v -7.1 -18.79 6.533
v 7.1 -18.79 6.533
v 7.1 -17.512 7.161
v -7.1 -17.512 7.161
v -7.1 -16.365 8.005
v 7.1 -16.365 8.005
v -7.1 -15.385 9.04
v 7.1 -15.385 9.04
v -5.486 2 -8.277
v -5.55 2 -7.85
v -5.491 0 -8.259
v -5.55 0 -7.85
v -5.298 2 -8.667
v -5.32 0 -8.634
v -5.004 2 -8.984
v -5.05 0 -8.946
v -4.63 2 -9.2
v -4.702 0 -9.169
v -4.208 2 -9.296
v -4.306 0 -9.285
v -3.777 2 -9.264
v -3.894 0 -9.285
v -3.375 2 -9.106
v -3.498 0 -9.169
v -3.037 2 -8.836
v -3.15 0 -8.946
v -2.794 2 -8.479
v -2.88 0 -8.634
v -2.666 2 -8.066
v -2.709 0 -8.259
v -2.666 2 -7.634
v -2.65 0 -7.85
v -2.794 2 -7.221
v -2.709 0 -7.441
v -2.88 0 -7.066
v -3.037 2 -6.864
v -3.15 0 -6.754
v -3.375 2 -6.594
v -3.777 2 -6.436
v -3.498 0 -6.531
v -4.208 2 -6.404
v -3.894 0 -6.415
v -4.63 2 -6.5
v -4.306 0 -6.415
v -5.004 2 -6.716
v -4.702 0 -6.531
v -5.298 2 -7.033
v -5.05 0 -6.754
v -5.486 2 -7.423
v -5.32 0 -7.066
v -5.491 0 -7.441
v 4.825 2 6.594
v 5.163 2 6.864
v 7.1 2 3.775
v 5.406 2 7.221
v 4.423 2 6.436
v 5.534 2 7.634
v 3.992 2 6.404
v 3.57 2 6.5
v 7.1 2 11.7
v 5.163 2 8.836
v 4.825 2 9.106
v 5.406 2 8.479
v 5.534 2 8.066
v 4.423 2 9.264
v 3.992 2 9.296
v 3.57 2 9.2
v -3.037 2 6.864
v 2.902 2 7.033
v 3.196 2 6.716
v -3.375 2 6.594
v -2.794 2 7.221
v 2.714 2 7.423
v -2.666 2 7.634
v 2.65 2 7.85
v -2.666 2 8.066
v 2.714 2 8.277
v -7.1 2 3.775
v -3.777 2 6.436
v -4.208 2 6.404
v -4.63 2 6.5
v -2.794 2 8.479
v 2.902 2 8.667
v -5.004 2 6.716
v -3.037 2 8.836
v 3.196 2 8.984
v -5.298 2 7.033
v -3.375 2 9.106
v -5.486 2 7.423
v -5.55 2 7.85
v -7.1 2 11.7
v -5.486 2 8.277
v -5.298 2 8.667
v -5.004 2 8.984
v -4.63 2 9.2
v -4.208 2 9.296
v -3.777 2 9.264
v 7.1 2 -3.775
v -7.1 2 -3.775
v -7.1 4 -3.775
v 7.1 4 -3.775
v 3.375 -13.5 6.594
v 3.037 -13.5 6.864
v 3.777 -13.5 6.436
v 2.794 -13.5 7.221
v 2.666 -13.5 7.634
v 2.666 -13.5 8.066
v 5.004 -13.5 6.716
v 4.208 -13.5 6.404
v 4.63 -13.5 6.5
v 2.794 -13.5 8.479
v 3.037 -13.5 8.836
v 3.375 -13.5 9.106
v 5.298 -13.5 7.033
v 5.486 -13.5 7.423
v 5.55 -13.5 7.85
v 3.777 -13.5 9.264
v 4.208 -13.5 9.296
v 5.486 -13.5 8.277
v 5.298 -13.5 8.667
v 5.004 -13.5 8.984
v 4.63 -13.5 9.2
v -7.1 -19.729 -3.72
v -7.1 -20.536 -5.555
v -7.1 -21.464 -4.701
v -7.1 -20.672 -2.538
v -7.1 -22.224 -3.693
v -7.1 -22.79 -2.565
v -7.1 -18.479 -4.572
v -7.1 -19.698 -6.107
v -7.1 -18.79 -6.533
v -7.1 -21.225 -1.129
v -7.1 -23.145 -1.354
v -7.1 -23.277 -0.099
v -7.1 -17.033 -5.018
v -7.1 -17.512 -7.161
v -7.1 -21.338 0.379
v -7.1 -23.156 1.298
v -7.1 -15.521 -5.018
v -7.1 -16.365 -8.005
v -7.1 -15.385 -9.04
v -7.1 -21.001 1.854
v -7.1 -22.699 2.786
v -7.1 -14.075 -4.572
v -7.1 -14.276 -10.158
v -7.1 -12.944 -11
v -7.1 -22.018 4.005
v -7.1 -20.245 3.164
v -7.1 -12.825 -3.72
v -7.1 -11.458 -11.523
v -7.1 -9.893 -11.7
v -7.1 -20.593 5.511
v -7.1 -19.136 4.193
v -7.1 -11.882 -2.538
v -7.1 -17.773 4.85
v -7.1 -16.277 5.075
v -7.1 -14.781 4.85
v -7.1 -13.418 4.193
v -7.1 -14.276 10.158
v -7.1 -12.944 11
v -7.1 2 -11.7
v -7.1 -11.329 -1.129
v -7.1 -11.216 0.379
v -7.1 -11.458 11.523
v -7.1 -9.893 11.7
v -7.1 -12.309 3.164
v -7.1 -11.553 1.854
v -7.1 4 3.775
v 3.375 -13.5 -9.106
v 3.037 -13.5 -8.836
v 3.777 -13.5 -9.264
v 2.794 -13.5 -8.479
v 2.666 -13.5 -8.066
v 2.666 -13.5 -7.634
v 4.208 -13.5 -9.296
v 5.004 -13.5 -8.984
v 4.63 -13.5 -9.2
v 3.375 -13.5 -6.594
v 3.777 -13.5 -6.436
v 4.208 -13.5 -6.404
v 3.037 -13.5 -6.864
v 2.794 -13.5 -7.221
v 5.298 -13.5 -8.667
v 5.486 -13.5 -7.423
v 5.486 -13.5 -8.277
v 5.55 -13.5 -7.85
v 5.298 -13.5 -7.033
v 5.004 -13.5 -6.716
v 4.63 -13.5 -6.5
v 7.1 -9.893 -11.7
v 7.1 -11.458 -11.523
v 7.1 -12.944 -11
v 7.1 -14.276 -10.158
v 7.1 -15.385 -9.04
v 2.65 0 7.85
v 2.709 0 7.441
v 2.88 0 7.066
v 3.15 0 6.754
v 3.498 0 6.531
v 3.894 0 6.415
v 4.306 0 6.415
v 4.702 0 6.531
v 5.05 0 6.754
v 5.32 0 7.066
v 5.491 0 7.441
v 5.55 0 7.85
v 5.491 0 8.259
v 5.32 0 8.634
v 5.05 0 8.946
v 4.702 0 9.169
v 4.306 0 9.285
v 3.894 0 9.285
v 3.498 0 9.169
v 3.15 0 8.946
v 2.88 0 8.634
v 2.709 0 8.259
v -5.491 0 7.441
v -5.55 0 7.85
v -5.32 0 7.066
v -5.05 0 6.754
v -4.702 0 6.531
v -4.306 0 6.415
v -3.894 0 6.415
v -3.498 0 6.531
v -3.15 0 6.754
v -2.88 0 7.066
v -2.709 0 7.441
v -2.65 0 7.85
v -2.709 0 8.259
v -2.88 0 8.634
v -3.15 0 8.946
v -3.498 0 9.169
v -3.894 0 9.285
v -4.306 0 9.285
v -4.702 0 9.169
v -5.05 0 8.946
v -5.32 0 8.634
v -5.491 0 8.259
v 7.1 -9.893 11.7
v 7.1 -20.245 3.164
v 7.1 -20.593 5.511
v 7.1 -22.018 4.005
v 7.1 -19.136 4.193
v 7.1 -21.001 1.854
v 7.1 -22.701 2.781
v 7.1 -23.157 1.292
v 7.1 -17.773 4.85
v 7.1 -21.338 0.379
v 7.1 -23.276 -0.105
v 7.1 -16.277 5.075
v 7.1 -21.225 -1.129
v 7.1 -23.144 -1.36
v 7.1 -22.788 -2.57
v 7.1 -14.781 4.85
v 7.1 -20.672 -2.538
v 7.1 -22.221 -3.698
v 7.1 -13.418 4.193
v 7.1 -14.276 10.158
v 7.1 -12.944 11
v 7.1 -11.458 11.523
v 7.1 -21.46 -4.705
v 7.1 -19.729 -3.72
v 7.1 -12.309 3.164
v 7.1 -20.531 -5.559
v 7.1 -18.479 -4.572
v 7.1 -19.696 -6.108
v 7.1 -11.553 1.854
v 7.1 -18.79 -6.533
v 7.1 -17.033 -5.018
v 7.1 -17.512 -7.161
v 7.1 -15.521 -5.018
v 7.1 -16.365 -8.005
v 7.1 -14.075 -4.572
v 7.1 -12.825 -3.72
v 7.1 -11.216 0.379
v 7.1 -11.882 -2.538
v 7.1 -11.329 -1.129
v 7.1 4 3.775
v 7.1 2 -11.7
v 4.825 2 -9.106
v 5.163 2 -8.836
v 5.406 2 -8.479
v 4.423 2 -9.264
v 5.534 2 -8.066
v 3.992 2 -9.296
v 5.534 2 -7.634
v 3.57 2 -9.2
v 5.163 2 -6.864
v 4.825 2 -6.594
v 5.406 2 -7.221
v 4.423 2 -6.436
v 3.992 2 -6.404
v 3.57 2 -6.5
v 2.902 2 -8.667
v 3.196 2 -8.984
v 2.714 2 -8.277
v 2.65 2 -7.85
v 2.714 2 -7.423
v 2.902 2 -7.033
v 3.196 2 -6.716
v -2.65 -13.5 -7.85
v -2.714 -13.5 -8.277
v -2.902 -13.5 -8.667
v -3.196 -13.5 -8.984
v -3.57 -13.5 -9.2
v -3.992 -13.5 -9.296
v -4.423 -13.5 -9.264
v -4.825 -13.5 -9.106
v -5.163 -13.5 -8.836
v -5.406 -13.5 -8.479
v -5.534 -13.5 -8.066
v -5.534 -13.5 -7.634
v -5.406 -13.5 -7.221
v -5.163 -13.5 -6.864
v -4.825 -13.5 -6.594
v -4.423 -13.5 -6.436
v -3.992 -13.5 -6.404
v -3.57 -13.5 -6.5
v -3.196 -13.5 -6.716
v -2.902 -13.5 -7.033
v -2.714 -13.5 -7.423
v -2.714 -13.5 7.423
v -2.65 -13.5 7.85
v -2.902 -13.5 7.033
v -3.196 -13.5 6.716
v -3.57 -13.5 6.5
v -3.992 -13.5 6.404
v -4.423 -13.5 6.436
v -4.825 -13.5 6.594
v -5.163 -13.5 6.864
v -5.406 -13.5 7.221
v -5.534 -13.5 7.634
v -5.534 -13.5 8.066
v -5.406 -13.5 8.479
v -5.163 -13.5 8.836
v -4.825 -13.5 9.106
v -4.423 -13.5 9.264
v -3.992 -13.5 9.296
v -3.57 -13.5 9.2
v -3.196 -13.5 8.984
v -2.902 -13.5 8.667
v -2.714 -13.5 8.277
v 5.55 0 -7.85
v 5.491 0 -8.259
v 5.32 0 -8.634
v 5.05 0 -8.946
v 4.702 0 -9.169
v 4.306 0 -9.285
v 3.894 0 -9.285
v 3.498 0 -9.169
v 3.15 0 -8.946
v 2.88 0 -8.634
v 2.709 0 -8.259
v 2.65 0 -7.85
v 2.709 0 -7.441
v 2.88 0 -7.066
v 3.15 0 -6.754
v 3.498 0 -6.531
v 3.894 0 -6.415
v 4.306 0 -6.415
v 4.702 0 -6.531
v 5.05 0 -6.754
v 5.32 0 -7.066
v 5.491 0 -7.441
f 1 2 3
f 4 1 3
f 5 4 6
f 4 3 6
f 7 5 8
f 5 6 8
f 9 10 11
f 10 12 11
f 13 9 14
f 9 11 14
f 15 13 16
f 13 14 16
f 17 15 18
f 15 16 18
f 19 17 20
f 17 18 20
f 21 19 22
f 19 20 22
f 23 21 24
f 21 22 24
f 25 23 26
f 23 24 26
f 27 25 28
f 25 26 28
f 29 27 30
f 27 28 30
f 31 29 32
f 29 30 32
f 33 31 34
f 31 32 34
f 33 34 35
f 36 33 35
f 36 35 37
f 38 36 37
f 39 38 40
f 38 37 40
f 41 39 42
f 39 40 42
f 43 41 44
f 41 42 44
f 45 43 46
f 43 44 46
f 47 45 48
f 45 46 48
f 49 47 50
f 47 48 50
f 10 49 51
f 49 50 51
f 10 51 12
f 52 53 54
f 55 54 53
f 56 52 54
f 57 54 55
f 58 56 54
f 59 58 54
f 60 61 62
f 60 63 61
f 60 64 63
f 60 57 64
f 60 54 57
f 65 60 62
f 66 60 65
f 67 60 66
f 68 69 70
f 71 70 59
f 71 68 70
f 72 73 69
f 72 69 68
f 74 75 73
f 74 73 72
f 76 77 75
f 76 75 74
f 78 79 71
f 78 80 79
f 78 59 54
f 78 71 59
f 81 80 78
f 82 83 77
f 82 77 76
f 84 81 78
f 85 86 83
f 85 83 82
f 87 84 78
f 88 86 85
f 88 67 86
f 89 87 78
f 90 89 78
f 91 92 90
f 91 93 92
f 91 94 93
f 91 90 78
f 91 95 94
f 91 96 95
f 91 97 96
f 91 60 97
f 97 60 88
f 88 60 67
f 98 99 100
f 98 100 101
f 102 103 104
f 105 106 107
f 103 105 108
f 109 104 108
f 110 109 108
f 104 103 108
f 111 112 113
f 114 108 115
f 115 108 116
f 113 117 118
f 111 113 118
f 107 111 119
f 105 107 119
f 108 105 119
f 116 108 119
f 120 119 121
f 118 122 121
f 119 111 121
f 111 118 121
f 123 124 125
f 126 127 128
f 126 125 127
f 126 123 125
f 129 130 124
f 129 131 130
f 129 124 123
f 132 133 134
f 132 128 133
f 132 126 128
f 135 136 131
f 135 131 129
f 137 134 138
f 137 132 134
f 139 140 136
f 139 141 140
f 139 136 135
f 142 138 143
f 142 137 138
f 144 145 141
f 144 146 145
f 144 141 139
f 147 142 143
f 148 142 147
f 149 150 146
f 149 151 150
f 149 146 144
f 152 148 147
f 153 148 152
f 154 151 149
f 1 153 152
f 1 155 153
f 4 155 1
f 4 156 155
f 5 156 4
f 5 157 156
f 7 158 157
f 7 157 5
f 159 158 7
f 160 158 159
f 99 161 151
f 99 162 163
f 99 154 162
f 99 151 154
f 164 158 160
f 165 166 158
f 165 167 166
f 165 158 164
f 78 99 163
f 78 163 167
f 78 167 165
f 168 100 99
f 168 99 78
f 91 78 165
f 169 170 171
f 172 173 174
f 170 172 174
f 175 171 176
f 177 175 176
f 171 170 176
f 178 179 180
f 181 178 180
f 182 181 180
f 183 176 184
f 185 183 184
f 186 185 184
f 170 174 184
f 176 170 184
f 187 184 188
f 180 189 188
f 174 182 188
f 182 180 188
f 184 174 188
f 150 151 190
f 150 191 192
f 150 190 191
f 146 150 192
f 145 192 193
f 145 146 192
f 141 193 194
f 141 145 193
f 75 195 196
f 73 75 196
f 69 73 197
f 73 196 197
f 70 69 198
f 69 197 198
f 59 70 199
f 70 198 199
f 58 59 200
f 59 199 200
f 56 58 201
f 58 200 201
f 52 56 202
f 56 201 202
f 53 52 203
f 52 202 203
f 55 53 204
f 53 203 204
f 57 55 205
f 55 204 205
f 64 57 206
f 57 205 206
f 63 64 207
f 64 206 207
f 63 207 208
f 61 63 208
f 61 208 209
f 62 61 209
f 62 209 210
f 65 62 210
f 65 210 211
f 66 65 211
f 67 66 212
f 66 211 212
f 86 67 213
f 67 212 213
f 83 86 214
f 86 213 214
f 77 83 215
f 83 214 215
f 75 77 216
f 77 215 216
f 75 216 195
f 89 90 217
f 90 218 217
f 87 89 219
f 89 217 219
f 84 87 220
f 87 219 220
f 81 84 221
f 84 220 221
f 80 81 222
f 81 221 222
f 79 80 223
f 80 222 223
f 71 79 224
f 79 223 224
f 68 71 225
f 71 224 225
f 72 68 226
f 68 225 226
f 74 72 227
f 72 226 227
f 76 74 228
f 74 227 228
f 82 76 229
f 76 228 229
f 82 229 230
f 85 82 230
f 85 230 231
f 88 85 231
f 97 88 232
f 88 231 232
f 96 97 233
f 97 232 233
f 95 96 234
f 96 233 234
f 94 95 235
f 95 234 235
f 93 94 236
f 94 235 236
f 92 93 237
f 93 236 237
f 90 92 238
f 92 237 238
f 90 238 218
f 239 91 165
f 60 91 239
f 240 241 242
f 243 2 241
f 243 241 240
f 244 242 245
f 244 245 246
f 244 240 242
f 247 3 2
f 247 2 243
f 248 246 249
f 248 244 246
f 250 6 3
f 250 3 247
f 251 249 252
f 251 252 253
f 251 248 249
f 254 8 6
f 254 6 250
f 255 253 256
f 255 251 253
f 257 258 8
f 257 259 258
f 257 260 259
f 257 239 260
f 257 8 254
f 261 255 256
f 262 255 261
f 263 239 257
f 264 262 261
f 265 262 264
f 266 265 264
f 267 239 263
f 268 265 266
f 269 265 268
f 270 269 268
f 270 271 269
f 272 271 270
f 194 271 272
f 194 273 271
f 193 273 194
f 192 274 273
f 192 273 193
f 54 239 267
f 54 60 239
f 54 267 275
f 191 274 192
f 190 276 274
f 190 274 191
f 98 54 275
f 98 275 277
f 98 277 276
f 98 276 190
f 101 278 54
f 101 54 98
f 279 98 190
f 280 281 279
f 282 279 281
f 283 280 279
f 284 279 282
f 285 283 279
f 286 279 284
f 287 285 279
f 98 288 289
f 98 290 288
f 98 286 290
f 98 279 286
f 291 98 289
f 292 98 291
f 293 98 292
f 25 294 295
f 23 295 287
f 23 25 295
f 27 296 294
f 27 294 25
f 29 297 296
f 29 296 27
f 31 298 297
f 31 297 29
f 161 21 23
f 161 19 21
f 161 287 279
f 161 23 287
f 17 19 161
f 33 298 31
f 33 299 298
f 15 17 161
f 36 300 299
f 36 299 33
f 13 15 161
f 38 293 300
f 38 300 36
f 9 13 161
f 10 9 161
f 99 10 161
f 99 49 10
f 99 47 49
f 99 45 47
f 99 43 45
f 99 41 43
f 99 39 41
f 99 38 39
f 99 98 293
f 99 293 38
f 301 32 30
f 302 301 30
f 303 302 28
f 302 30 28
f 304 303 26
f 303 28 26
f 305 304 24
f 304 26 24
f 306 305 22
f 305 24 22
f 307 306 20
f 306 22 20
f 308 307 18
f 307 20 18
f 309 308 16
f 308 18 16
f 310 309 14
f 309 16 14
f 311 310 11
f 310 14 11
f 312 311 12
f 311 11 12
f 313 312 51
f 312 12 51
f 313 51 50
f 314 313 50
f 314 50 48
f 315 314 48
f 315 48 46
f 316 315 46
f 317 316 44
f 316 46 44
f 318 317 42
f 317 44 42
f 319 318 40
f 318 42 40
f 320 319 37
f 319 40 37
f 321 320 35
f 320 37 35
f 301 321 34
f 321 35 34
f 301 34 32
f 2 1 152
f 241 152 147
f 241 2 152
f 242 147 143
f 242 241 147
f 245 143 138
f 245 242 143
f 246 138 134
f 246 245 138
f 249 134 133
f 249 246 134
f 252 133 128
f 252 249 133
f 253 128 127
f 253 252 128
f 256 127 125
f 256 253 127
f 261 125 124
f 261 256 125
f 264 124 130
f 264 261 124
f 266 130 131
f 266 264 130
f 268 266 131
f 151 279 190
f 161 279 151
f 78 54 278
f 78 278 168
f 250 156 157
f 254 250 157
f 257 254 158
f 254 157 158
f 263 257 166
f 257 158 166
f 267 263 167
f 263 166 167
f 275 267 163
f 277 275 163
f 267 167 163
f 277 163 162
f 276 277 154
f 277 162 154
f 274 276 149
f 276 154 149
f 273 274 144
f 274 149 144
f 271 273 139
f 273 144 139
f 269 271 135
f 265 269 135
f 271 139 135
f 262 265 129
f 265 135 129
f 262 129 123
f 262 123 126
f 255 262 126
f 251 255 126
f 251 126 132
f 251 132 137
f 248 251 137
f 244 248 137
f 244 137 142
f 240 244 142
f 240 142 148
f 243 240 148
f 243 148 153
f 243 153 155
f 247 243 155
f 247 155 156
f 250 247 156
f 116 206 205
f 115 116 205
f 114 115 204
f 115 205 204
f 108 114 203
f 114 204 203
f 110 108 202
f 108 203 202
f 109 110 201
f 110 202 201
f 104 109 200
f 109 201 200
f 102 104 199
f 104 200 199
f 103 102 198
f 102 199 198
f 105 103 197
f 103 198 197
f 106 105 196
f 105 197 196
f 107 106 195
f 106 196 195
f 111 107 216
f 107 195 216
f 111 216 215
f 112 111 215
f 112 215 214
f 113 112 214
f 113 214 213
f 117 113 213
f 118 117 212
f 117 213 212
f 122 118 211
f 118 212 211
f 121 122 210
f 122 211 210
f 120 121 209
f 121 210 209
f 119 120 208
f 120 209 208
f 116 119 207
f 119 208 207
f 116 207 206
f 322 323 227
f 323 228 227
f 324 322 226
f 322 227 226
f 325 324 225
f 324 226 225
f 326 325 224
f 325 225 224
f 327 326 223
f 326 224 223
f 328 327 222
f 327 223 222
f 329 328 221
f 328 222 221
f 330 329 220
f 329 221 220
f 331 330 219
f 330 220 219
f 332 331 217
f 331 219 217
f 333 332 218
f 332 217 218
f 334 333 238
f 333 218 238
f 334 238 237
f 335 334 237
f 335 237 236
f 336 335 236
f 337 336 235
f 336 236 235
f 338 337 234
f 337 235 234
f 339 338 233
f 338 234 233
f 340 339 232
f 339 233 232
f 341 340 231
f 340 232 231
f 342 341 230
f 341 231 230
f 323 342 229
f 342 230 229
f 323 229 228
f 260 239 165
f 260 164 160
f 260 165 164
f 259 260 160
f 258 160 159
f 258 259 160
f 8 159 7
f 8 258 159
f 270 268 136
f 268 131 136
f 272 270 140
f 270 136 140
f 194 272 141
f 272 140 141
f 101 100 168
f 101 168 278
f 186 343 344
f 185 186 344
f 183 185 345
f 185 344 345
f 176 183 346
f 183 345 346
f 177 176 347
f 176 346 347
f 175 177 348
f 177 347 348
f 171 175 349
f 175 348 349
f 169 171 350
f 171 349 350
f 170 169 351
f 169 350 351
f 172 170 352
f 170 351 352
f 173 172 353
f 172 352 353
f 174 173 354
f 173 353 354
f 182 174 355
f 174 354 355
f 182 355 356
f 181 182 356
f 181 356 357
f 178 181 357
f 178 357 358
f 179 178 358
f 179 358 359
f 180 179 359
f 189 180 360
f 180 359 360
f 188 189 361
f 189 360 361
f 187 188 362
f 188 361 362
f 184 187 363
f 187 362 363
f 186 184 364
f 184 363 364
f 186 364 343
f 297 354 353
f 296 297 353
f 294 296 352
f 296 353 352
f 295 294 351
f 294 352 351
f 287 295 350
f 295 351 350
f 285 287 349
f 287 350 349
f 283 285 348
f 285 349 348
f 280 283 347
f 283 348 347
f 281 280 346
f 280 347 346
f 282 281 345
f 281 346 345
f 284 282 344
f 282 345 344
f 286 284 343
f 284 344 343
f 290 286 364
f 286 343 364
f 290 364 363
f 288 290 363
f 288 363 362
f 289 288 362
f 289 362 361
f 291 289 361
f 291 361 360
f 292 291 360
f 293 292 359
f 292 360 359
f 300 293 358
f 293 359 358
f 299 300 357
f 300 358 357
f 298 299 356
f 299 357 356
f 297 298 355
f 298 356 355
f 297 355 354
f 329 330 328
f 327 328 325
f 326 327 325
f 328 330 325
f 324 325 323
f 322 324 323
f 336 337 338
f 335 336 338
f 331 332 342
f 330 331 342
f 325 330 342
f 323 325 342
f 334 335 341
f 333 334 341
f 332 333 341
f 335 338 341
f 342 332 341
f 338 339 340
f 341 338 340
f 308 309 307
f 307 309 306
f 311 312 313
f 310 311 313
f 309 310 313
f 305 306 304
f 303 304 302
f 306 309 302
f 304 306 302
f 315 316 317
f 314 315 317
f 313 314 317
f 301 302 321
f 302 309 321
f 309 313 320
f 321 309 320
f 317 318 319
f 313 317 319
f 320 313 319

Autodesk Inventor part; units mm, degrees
ref_plane "YZ Plane" through (0, 0, 0) normal (1, 0, 0) x (0, 1, 0)
ref_plane "XZ Plane" through (0, 0, 0) normal (0, 1, 0) x (-1, 0, 0)
ref_plane "XY Plane" through (0, 0, 0) normal (0, 0, 1) x (1, 0, 0)
sketch "Boceto1" plane through (0, 0, 0) normal (0, 1, 0) x (-1, 0, 0)
  line L0 (7.1, 11.7) -> (-7.1, 11.7)
  line L1 (-7.1, 11.7) -> (-7.1, -11.7)
  line L2 (-7.1, -11.7) -> (7.1, -11.7)
  line L3 (7.1, -11.7) -> (7.1, 11.7)
  line L4 (7.1, 11.7) -> (-7.1, -11.7) construction
  line L5 (-7.1, 11.7) -> (7.1, -11.7) construction
  circle A0 centre (4.1, 7.85) radius 1.45
  circle A1 centre (-4.1, 7.85) radius 1.45
  circle A2 centre (4.1, -7.85) radius 1.45
  circle A3 centre (-4.1, -7.85) radius 1.45
  point P0 (0, 0)
  dimension "d0" = 23.4
  dimension "d1" = 14.2
  dimension "d2" = 2.9
  dimension "d3" = 8.2
  dimension "d4" = 4.1
  dimension "d5" = 7.85
  dimension "d6" = 7.85
extrude "Extrusión1" add sketch "Boceto1" along normal blind 2
sketch "Boceto2" plane through (0, 2, 0) normal (0, 1, 0) x (1, 0, 0)
  line L0 (-7.1, 11.7) -> (-7.1, -11.7) projected
  line L1 (7.1, -3.775) -> (-7.1, -3.775)
  line L2 (-7.1, -3.775) -> (-7.1, 3.775)
  line L3 (-7.1, 3.775) -> (7.1, 3.775)
  line L4 (7.1, 3.775) -> (7.1, -3.775)
  line L5 (7.1, -3.775) -> (-7.1, 3.775) construction
  line L6 (-7.1, -3.775) -> (7.1, 3.775) construction
  point P0 (0, 0)
  point P1 (-7.1, 9.7)
  point P2 (-7.1, -9.7)
  point P3 (-7.1, -3.775)
  dimension "d10" = 7.55
extrude "Extrusión2" add sketch "Boceto2" along normal blind 2
sketch "Boceto3" plane through (0, 0, 0) normal (0, -1, 0) x (1, 0, 0)
  line L0 (-7.1, 11.7) -> (7.1, 11.7) projected
  line L1 (-7.1, -11.7) -> (-7.1, 11.7) projected
  line L2 (7.1, -11.7) -> (-7.1, -11.7) projected
  line L3 (7.1, 11.7) -> (7.1, -11.7) projected
  circle A0 centre (-4.1, 7.85) radius 1.45 projected
  circle A1 centre (4.1, 7.85) radius 1.45 projected
  circle A2 centre (-4.1, -7.85) radius 1.45 projected
  circle A3 centre (4.1, -7.85) radius 1.45 projected
  point P0 (0, 0)
extrude "Extrusión3" add sketch "Boceto3" along normal blind 14
sketch "Boceto5" plane through (0, -14, 0) normal (0, -1, 0) x (1, 0, 0)
  line L0 (7.1, -11.7) -> (7.1, 11.7) projected
  line L1 (-7.1, -6) -> (7.1, -6)
  line L2 (7.1, -6) -> (7.1, 6)
  line L3 (7.1, 6) -> (-7.1, 6)
  line L4 (-7.1, 6) -> (-7.1, -6)
  line L5 (-7.1, -6) -> (7.1, 6) construction
  line L6 (7.1, -6) -> (-7.1, 6) construction
  point P0 (0, 0)
  point P1 (7.1, -9.7)
  point P2 (7.1, 9.7)
  point P3 (7.1, -6)
  dimension "d16" = 12
extrude "Extrusión4" add sketch "Boceto5" along normal blind 14
sketch "Boceto7" plane through (0, -14, 0) normal (0, -1, 0) x (1, 0, 0)
  circle A0 centre (-4.1, 7.85) radius 1.45 projected
  circle A1 centre (4.1, 7.85) radius 1.45 projected
  circle A2 centre (4.1, -7.85) radius 1.45 projected
  circle A3 centre (-4.1, -7.85) radius 1.45 projected
  point P0 (0, 0)
extrude "Extrusión6" add sketch "Boceto7" against normal blind 0.5
fillet "Empalme3" radius 8 2 edges at (0, -14, 6) (0, -14, -6)
fillet "Empalme4" radius 7 2 edges at (0, -28, -6) (0, -28, 6)
fillet "Empalme5" radius 7 2 edges at (0, -14, -11.7) (0, -14, 11.7)
sketch "Boceto8" plane through (-7.1, 2, 3.775) normal (-1, 0, 0) x (0, 0, 1)
  arc A0 (-10.3083, -20.7902) -> (2.7583, -20.7902) centre (-3.775, -18.2771) ccw projected
  circle A1 centre (-3.775, -18.2771) radius 5.075
  point P0 (-3.775, -2)
  dimension "d28" = 10.15
extrude "Extrusión7" cut sketch "Boceto8" against normal through all
properties part number "MiddleJoint"
